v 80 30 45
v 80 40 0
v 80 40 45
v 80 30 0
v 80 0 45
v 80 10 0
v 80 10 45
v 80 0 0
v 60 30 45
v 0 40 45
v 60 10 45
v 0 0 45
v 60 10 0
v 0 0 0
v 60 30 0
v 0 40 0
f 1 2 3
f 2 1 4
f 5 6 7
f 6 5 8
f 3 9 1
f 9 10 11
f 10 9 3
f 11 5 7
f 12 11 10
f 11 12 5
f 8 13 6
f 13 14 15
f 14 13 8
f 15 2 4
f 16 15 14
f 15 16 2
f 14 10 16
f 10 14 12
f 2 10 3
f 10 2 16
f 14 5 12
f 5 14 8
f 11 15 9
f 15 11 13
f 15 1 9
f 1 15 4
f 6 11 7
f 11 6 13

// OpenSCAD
difference()
{
  cube([80,40,45]);
  *translate([-1,-2,-1]) cube([17,50,35]);
  translate([60,10,-1]) cube([30,20,50]);
}
